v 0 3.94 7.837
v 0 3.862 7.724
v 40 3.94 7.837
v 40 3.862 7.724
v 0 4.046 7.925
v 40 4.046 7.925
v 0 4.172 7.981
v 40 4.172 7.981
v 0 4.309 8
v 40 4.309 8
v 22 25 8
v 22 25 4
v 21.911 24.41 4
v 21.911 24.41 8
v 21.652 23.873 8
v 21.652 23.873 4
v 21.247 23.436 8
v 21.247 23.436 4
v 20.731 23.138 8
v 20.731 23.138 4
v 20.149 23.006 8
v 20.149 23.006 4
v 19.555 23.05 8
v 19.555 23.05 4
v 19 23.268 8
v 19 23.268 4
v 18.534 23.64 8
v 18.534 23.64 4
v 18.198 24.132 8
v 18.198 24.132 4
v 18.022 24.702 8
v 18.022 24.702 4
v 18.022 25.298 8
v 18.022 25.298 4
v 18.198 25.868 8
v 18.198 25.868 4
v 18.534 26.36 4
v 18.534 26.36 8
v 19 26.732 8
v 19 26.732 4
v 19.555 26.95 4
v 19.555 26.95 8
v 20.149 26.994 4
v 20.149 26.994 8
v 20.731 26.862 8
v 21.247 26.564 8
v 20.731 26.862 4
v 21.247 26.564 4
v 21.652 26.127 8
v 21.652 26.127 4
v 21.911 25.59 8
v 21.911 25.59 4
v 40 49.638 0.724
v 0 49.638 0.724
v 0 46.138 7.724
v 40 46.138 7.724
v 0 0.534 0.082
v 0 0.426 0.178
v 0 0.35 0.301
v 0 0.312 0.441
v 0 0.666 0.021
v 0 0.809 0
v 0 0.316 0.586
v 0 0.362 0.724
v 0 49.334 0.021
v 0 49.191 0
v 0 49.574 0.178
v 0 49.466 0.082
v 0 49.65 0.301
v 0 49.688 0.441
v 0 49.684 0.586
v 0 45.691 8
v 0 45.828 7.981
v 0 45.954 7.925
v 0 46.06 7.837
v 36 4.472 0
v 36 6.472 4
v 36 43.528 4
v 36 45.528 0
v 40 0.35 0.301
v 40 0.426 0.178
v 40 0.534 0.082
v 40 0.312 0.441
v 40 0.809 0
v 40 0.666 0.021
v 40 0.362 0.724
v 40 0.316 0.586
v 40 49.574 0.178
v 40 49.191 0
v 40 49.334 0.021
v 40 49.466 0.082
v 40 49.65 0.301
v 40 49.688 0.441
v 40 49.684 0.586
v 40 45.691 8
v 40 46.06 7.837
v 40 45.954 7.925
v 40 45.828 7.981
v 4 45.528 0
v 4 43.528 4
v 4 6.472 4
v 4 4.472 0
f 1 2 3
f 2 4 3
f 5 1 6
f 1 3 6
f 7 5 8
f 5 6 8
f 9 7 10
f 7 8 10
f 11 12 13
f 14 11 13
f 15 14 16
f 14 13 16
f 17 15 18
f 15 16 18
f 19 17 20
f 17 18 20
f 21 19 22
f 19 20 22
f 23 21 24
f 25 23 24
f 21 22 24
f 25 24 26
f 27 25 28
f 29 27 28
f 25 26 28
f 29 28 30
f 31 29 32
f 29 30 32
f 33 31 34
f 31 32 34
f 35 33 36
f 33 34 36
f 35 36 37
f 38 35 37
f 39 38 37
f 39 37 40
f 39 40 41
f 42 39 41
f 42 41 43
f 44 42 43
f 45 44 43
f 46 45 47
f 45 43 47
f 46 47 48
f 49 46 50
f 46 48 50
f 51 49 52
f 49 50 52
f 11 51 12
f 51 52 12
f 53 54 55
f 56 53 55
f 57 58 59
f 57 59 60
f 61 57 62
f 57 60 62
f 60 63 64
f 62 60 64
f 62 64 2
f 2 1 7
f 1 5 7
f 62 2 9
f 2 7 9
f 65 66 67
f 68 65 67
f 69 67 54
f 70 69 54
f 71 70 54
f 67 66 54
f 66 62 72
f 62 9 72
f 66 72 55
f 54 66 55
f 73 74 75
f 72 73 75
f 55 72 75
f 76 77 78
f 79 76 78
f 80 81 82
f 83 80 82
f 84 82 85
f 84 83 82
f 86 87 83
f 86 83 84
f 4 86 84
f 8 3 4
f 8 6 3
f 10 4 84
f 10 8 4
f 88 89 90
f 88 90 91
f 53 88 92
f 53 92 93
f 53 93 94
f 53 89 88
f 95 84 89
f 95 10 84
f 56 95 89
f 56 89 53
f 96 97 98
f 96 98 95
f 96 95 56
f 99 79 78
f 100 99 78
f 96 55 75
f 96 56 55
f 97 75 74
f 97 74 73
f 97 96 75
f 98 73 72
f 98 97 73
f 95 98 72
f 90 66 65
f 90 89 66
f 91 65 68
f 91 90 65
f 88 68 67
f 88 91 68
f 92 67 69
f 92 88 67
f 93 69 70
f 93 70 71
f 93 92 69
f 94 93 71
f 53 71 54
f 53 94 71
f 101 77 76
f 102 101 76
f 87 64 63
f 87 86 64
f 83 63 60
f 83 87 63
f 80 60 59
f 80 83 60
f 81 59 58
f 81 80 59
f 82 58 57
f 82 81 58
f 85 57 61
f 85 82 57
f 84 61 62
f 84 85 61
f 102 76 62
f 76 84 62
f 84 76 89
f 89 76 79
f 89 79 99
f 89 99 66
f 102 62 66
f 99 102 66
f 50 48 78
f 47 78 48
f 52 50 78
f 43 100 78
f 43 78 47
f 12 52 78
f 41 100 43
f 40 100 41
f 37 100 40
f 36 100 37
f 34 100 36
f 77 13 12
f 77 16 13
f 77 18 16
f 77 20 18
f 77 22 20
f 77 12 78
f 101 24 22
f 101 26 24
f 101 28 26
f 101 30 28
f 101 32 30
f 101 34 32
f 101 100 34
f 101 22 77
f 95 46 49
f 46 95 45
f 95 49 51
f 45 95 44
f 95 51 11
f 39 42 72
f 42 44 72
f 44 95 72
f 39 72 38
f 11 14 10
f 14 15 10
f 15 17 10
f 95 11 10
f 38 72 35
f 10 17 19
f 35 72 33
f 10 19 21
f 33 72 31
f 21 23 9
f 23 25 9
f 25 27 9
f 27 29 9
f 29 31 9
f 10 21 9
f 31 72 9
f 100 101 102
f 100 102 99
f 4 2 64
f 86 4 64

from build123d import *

# Parameters (mm, degrees)
F1_DEPTH = 40
F2_R     = 0.5
F3_T     = 4
F4_R     = 2
F5_DEPTH = 4


# Not quite as in the source:
# - a shell that OpenCascade refuses in one call is made with other operations: the cavity is built on its own and cut out


with BuildPart() as f1:
    # F0 (on Right) → F1 (new body)
    with BuildSketch(Plane.YZ):
        Polygon((4, 8), (0, 0), (50, 0), (46, 8), align=None)
    extrude(amount=F1_DEPTH)

    # F2
    f2_edges = [f1.edges().sort_by_distance(p)[0] for p in [
        (20, 4, 8),
        (20, 46, 8),
        (20, 0, 0),
        (20, 50, 0),
    ]]
    fillet(f2_edges, radius=F2_R)

    # F3: shell of thickness 4, made by hand


with BuildPart() as f3_core1:
    # F3_t2: copy of F1
    add(f1.part)

    # the walls: a layer under each face that stays
    f3_faces = [f3_core1.faces().sort_by_distance(p)[0] for p in [
        (20, 2.1118033989, 4.2236067977),
        (0, 25, 4),
        (40, 25, 4),
        (20, 25, 8),
        (20, 47.8881966011, 4.2236067977),
    ]]
    thicken(f3_faces, amount=-F3_T, mode=Mode.SUBTRACT)


with BuildPart() as f1_1:
    add(f1.part)

    # what is left inside the walls is the cavity
    f3_cavity = [f3_core1.part.solids().sort_by_distance(p)[0] for p in [
        (25.333333, 25, 0.04),
    ]]
    add(f3_cavity, mode=Mode.SUBTRACT)

    # F4 (on face) → F5 (cut, through all)
    with BuildSketch(Plane(origin=(0, 0, 4), x_dir=(1, 0, 0), z_dir=(0, 0, -1))):
        with Locations((20, -25)):
            Circle(F4_R)
    extrude(amount=-F5_DEPTH, mode=Mode.SUBTRACT)


solid = f1_1.part
